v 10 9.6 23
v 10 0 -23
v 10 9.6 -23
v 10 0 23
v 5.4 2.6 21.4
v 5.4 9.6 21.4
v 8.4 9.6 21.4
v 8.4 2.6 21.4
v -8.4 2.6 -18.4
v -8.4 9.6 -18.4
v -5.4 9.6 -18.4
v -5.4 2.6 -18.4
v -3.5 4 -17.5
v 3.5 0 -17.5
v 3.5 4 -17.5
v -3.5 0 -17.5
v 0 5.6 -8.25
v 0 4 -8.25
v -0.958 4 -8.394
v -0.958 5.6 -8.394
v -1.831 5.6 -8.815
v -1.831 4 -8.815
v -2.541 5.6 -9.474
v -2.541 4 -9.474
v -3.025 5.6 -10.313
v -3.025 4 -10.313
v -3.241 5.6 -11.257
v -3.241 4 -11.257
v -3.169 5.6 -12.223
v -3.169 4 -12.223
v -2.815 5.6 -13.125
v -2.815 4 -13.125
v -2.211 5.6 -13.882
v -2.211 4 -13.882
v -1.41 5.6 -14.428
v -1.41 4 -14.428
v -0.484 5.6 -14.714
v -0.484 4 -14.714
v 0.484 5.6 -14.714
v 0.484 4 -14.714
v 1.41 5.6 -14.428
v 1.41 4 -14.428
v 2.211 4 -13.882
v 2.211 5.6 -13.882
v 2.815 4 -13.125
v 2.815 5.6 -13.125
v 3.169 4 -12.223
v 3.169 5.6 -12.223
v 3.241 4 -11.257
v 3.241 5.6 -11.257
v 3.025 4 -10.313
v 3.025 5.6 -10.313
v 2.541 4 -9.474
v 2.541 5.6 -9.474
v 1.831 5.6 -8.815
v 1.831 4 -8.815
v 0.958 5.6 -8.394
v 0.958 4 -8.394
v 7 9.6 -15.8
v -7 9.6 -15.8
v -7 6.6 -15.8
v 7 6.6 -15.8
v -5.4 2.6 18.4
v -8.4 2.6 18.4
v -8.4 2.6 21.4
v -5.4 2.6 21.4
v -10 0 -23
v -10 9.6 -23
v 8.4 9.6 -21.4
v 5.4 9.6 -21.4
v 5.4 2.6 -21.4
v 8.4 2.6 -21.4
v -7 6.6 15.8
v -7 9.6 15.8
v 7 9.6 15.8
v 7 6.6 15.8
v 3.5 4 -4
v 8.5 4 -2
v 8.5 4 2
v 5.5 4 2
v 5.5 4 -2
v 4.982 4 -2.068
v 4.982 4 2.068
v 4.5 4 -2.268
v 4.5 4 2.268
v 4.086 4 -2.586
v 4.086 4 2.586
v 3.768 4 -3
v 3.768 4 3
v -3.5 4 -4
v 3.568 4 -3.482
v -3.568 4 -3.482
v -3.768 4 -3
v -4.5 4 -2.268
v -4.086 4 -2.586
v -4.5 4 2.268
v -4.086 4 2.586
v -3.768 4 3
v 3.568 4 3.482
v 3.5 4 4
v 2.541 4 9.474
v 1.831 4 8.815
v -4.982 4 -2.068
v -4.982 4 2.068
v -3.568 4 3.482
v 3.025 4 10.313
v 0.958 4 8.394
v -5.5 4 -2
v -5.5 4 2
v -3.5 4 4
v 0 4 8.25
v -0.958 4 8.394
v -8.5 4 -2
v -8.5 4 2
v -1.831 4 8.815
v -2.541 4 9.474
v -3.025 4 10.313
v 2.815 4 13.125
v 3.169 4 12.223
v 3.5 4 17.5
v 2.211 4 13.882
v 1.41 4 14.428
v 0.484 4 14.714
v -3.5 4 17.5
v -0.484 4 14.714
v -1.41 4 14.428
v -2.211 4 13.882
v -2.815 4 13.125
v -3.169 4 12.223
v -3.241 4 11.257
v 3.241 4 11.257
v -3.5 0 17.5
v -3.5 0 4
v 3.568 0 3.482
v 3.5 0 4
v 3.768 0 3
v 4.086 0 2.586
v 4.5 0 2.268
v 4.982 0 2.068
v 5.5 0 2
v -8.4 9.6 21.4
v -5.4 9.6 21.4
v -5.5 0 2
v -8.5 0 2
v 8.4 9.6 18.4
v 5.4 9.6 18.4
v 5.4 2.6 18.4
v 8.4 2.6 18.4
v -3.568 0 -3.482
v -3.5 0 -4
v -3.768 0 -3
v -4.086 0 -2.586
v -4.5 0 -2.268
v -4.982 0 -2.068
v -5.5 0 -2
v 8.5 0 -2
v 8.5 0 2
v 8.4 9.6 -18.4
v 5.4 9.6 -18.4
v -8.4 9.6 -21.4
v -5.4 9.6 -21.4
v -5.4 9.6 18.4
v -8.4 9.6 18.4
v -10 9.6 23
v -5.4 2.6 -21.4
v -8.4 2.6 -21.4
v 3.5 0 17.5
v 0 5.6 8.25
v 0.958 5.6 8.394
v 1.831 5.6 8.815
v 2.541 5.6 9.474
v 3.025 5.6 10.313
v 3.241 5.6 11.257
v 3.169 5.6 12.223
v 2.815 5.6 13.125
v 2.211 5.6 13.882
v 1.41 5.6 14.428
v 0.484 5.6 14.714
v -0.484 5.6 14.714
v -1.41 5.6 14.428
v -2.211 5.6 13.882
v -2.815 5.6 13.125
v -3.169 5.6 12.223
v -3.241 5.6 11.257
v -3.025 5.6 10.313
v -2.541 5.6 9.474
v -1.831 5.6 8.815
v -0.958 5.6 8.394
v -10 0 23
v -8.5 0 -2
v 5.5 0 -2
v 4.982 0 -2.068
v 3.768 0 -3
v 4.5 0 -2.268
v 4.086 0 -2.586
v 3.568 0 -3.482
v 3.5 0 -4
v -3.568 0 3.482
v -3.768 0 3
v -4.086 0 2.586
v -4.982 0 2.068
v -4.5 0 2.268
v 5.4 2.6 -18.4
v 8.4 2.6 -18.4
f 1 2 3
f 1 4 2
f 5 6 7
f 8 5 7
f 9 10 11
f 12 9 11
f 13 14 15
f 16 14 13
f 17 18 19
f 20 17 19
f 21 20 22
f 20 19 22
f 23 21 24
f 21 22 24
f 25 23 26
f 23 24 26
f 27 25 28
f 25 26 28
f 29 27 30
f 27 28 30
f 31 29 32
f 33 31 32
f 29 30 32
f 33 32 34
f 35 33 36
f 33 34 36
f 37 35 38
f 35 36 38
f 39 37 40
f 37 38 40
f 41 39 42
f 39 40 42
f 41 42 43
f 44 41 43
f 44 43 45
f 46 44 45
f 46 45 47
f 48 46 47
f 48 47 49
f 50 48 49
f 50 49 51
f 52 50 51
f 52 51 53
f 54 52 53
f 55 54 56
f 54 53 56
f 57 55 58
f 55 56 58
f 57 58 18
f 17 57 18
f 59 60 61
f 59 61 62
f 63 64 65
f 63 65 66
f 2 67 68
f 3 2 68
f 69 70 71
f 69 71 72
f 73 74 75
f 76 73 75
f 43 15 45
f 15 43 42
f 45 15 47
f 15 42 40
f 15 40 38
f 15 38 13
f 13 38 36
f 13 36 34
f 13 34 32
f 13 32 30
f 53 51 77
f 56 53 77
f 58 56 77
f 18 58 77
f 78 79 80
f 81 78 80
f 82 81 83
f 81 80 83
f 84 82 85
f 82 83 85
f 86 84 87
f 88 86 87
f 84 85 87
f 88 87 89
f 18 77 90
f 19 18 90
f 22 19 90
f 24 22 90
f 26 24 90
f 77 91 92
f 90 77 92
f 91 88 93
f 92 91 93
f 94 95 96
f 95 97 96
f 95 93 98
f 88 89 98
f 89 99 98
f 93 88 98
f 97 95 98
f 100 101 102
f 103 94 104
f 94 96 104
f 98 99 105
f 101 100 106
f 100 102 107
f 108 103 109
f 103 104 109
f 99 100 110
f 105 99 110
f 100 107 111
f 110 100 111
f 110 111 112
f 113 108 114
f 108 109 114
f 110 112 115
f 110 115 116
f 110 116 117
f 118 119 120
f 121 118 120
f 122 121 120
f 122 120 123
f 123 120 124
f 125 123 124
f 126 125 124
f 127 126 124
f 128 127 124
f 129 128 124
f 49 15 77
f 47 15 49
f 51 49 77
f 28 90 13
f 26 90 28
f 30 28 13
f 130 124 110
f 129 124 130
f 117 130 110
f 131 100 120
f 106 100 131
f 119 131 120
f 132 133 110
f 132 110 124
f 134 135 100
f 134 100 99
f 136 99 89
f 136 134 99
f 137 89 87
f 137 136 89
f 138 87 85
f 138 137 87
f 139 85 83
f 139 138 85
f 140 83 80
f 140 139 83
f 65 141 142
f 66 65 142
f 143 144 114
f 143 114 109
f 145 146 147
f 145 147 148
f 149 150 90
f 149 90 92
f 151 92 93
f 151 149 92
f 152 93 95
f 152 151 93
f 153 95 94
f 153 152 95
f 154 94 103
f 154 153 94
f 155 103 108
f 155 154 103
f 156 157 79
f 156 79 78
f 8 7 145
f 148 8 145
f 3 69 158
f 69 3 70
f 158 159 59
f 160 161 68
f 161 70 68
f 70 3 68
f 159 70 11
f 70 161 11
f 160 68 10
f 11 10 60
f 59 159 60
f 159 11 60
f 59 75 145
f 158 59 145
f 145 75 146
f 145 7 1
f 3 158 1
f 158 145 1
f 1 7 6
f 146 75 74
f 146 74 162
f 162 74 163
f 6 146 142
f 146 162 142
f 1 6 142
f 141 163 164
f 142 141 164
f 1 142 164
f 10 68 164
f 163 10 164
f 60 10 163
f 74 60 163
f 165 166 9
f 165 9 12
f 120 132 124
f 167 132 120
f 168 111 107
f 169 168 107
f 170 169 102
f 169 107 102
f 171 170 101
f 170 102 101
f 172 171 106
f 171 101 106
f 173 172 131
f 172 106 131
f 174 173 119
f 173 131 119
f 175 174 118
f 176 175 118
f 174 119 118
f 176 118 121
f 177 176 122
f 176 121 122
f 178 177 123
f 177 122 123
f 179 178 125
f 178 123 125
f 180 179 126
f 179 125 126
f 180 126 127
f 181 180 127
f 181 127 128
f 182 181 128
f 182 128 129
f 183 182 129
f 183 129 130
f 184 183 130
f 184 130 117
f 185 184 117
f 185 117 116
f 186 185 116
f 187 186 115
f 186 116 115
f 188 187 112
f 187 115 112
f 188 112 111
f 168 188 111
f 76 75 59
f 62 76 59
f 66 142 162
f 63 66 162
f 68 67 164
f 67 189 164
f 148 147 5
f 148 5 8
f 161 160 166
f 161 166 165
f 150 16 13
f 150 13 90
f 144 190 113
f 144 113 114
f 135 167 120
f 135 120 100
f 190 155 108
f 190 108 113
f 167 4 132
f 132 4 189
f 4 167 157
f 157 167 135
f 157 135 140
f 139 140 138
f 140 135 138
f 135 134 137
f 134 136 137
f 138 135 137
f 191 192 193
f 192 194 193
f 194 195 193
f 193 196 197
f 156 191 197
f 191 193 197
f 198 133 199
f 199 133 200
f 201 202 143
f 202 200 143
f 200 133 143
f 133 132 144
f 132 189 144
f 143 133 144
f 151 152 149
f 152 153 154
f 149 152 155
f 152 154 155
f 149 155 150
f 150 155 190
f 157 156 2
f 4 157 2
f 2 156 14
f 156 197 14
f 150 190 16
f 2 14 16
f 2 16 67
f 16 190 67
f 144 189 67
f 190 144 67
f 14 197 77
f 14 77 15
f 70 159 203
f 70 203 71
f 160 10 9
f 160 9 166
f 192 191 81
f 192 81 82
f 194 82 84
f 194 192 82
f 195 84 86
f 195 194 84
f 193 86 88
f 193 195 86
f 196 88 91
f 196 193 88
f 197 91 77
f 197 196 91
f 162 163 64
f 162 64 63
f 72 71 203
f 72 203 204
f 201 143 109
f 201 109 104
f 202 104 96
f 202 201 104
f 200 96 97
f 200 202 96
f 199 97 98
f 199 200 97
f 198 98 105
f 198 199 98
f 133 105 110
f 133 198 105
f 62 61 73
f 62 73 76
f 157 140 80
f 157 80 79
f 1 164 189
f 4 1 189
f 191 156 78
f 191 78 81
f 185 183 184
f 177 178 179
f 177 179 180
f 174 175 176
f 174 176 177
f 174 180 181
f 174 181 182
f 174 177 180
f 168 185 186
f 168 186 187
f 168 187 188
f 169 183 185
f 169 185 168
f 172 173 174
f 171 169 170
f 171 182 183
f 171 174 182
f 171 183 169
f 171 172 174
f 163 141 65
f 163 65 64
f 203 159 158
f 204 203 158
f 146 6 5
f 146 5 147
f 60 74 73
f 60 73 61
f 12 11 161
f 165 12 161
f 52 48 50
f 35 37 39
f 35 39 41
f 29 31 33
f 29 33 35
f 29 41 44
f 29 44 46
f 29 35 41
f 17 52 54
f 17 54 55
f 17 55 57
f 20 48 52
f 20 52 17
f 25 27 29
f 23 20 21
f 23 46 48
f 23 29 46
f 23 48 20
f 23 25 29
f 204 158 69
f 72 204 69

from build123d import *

# Parameters (mm, degrees)
SKETCH1_W           = 20
SKETCH1_H           = 42
BOSS_EXTRUDE1_DEPTH = 7.6
CUT_EXTRUDE1_DEPTH  = 4
THICKEN1_START      = -10
THICKEN1_DEPTH      = 20
SKETCH3_R           = 3.25
CUT_EXTRUDE2_DEPTH  = 1.6
SKETCH5_W           = 3
SKETCH5_H           = 3
CUT_EXTRUDE4_DEPTH  = 7
SKETCH6_W           = 14
SKETCH6_H           = 31.6
CUT_EXTRUDE5_DEPTH  = 3


# Read off the part's stored shape, not the designer's step: Thicken1
with BuildPart() as part:
    # Sketch1 → Boss-Extrude1 (new body)
    with BuildSketch(Plane(origin=(0, 0, 0), x_dir=(1, 0, 0), z_dir=(0, 1, 0))):
        Rectangle(SKETCH1_W, SKETCH1_H)
    extrude(amount=BOSS_EXTRUDE1_DEPTH)

    # Sketch2 → Cut-Extrude1 (cut)
    with BuildSketch(Plane.XZ):
        with BuildLine():
            Line((5.5, 2), (8.5, 2))
            Line((8.5, 2), (8.5, -2))
            Line((8.5, -2), (5.5, -2))
            ThreePointArc((5.5, -2), (4.085786438, -2.585786438), (3.5, -4))
            Line((3.5, -4), (3.5, -17.5))
            Line((3.5, -17.5), (-3.5, -17.5))
            Line((-3.5, -17.5), (-3.5, -4))
            ThreePointArc((-3.5, -4), (-4.085786438, -2.585786438), (-5.5, -2))
            Line((-5.5, -2), (-8.5, -2))
            Line((-8.5, -2), (-8.5, 2))
            Line((-8.5, 2), (-5.5, 2))
            ThreePointArc((-5.5, 2), (-4.085786438, 2.585786438), (-3.5, 4))
            Line((-3.5, 4), (-3.5, 17.5))
            Line((-3.5, 17.5), (3.5, 17.5))
            Line((3.5, 17.5), (3.5, 4))
            ThreePointArc((3.5, 4), (4.085786438, 2.585786438), (5.5, 2))
        make_face()
    extrude(amount=-CUT_EXTRUDE1_DEPTH, mode=Mode.SUBTRACT)

    # Thicken1 outline → Thicken1 (add)
    with BuildSketch(Plane.YZ.offset(THICKEN1_START)):
        Polygon((0, -23), (9.6, -23), (9.6, 23), (0, 23), (0, 21), (7.6, 21), (7.6, -21), (0, -21), align=None)
    extrude(amount=THICKEN1_DEPTH)

    # Sketch3 → Cut-Extrude2 (cut)
    with BuildSketch(Plane.XZ.offset(-4)):
        with Locations(Location((0, 11.5, 0), (0, 0, 270))):
            Circle(SKETCH3_R)
        with Locations(Location((0, -11.5, 0), (0, 0, 90))):
            Circle(SKETCH3_R)
    extrude(amount=-CUT_EXTRUDE2_DEPTH, mode=Mode.SUBTRACT)

    # Sketch5 → Cut-Extrude4 (cut)
    with BuildSketch(Plane(origin=(0, 9.6, 0), x_dir=(1, 0, 0), z_dir=(0, 1, 0))):
        with Locations((-6.9, 19.9)):
            Rectangle(SKETCH5_W, SKETCH5_H)
        with Locations((6.9, 19.9)):
            Rectangle(SKETCH5_W, SKETCH5_H)
        with Locations((6.9, -19.9)):
            Rectangle(SKETCH5_W, SKETCH5_H)
        with Locations((-6.9, -19.9)):
            Rectangle(SKETCH5_W, SKETCH5_H)
    extrude(amount=-CUT_EXTRUDE4_DEPTH, mode=Mode.SUBTRACT)

    # Sketch6 → Cut-Extrude5 (cut)
    with BuildSketch(Plane(origin=(0, 9.6, 0), x_dir=(1, 0, 0), z_dir=(0, 1, 0))):
        Rectangle(SKETCH6_W, SKETCH6_H)
    extrude(amount=-CUT_EXTRUDE5_DEPTH, mode=Mode.SUBTRACT)


solid = part.part
